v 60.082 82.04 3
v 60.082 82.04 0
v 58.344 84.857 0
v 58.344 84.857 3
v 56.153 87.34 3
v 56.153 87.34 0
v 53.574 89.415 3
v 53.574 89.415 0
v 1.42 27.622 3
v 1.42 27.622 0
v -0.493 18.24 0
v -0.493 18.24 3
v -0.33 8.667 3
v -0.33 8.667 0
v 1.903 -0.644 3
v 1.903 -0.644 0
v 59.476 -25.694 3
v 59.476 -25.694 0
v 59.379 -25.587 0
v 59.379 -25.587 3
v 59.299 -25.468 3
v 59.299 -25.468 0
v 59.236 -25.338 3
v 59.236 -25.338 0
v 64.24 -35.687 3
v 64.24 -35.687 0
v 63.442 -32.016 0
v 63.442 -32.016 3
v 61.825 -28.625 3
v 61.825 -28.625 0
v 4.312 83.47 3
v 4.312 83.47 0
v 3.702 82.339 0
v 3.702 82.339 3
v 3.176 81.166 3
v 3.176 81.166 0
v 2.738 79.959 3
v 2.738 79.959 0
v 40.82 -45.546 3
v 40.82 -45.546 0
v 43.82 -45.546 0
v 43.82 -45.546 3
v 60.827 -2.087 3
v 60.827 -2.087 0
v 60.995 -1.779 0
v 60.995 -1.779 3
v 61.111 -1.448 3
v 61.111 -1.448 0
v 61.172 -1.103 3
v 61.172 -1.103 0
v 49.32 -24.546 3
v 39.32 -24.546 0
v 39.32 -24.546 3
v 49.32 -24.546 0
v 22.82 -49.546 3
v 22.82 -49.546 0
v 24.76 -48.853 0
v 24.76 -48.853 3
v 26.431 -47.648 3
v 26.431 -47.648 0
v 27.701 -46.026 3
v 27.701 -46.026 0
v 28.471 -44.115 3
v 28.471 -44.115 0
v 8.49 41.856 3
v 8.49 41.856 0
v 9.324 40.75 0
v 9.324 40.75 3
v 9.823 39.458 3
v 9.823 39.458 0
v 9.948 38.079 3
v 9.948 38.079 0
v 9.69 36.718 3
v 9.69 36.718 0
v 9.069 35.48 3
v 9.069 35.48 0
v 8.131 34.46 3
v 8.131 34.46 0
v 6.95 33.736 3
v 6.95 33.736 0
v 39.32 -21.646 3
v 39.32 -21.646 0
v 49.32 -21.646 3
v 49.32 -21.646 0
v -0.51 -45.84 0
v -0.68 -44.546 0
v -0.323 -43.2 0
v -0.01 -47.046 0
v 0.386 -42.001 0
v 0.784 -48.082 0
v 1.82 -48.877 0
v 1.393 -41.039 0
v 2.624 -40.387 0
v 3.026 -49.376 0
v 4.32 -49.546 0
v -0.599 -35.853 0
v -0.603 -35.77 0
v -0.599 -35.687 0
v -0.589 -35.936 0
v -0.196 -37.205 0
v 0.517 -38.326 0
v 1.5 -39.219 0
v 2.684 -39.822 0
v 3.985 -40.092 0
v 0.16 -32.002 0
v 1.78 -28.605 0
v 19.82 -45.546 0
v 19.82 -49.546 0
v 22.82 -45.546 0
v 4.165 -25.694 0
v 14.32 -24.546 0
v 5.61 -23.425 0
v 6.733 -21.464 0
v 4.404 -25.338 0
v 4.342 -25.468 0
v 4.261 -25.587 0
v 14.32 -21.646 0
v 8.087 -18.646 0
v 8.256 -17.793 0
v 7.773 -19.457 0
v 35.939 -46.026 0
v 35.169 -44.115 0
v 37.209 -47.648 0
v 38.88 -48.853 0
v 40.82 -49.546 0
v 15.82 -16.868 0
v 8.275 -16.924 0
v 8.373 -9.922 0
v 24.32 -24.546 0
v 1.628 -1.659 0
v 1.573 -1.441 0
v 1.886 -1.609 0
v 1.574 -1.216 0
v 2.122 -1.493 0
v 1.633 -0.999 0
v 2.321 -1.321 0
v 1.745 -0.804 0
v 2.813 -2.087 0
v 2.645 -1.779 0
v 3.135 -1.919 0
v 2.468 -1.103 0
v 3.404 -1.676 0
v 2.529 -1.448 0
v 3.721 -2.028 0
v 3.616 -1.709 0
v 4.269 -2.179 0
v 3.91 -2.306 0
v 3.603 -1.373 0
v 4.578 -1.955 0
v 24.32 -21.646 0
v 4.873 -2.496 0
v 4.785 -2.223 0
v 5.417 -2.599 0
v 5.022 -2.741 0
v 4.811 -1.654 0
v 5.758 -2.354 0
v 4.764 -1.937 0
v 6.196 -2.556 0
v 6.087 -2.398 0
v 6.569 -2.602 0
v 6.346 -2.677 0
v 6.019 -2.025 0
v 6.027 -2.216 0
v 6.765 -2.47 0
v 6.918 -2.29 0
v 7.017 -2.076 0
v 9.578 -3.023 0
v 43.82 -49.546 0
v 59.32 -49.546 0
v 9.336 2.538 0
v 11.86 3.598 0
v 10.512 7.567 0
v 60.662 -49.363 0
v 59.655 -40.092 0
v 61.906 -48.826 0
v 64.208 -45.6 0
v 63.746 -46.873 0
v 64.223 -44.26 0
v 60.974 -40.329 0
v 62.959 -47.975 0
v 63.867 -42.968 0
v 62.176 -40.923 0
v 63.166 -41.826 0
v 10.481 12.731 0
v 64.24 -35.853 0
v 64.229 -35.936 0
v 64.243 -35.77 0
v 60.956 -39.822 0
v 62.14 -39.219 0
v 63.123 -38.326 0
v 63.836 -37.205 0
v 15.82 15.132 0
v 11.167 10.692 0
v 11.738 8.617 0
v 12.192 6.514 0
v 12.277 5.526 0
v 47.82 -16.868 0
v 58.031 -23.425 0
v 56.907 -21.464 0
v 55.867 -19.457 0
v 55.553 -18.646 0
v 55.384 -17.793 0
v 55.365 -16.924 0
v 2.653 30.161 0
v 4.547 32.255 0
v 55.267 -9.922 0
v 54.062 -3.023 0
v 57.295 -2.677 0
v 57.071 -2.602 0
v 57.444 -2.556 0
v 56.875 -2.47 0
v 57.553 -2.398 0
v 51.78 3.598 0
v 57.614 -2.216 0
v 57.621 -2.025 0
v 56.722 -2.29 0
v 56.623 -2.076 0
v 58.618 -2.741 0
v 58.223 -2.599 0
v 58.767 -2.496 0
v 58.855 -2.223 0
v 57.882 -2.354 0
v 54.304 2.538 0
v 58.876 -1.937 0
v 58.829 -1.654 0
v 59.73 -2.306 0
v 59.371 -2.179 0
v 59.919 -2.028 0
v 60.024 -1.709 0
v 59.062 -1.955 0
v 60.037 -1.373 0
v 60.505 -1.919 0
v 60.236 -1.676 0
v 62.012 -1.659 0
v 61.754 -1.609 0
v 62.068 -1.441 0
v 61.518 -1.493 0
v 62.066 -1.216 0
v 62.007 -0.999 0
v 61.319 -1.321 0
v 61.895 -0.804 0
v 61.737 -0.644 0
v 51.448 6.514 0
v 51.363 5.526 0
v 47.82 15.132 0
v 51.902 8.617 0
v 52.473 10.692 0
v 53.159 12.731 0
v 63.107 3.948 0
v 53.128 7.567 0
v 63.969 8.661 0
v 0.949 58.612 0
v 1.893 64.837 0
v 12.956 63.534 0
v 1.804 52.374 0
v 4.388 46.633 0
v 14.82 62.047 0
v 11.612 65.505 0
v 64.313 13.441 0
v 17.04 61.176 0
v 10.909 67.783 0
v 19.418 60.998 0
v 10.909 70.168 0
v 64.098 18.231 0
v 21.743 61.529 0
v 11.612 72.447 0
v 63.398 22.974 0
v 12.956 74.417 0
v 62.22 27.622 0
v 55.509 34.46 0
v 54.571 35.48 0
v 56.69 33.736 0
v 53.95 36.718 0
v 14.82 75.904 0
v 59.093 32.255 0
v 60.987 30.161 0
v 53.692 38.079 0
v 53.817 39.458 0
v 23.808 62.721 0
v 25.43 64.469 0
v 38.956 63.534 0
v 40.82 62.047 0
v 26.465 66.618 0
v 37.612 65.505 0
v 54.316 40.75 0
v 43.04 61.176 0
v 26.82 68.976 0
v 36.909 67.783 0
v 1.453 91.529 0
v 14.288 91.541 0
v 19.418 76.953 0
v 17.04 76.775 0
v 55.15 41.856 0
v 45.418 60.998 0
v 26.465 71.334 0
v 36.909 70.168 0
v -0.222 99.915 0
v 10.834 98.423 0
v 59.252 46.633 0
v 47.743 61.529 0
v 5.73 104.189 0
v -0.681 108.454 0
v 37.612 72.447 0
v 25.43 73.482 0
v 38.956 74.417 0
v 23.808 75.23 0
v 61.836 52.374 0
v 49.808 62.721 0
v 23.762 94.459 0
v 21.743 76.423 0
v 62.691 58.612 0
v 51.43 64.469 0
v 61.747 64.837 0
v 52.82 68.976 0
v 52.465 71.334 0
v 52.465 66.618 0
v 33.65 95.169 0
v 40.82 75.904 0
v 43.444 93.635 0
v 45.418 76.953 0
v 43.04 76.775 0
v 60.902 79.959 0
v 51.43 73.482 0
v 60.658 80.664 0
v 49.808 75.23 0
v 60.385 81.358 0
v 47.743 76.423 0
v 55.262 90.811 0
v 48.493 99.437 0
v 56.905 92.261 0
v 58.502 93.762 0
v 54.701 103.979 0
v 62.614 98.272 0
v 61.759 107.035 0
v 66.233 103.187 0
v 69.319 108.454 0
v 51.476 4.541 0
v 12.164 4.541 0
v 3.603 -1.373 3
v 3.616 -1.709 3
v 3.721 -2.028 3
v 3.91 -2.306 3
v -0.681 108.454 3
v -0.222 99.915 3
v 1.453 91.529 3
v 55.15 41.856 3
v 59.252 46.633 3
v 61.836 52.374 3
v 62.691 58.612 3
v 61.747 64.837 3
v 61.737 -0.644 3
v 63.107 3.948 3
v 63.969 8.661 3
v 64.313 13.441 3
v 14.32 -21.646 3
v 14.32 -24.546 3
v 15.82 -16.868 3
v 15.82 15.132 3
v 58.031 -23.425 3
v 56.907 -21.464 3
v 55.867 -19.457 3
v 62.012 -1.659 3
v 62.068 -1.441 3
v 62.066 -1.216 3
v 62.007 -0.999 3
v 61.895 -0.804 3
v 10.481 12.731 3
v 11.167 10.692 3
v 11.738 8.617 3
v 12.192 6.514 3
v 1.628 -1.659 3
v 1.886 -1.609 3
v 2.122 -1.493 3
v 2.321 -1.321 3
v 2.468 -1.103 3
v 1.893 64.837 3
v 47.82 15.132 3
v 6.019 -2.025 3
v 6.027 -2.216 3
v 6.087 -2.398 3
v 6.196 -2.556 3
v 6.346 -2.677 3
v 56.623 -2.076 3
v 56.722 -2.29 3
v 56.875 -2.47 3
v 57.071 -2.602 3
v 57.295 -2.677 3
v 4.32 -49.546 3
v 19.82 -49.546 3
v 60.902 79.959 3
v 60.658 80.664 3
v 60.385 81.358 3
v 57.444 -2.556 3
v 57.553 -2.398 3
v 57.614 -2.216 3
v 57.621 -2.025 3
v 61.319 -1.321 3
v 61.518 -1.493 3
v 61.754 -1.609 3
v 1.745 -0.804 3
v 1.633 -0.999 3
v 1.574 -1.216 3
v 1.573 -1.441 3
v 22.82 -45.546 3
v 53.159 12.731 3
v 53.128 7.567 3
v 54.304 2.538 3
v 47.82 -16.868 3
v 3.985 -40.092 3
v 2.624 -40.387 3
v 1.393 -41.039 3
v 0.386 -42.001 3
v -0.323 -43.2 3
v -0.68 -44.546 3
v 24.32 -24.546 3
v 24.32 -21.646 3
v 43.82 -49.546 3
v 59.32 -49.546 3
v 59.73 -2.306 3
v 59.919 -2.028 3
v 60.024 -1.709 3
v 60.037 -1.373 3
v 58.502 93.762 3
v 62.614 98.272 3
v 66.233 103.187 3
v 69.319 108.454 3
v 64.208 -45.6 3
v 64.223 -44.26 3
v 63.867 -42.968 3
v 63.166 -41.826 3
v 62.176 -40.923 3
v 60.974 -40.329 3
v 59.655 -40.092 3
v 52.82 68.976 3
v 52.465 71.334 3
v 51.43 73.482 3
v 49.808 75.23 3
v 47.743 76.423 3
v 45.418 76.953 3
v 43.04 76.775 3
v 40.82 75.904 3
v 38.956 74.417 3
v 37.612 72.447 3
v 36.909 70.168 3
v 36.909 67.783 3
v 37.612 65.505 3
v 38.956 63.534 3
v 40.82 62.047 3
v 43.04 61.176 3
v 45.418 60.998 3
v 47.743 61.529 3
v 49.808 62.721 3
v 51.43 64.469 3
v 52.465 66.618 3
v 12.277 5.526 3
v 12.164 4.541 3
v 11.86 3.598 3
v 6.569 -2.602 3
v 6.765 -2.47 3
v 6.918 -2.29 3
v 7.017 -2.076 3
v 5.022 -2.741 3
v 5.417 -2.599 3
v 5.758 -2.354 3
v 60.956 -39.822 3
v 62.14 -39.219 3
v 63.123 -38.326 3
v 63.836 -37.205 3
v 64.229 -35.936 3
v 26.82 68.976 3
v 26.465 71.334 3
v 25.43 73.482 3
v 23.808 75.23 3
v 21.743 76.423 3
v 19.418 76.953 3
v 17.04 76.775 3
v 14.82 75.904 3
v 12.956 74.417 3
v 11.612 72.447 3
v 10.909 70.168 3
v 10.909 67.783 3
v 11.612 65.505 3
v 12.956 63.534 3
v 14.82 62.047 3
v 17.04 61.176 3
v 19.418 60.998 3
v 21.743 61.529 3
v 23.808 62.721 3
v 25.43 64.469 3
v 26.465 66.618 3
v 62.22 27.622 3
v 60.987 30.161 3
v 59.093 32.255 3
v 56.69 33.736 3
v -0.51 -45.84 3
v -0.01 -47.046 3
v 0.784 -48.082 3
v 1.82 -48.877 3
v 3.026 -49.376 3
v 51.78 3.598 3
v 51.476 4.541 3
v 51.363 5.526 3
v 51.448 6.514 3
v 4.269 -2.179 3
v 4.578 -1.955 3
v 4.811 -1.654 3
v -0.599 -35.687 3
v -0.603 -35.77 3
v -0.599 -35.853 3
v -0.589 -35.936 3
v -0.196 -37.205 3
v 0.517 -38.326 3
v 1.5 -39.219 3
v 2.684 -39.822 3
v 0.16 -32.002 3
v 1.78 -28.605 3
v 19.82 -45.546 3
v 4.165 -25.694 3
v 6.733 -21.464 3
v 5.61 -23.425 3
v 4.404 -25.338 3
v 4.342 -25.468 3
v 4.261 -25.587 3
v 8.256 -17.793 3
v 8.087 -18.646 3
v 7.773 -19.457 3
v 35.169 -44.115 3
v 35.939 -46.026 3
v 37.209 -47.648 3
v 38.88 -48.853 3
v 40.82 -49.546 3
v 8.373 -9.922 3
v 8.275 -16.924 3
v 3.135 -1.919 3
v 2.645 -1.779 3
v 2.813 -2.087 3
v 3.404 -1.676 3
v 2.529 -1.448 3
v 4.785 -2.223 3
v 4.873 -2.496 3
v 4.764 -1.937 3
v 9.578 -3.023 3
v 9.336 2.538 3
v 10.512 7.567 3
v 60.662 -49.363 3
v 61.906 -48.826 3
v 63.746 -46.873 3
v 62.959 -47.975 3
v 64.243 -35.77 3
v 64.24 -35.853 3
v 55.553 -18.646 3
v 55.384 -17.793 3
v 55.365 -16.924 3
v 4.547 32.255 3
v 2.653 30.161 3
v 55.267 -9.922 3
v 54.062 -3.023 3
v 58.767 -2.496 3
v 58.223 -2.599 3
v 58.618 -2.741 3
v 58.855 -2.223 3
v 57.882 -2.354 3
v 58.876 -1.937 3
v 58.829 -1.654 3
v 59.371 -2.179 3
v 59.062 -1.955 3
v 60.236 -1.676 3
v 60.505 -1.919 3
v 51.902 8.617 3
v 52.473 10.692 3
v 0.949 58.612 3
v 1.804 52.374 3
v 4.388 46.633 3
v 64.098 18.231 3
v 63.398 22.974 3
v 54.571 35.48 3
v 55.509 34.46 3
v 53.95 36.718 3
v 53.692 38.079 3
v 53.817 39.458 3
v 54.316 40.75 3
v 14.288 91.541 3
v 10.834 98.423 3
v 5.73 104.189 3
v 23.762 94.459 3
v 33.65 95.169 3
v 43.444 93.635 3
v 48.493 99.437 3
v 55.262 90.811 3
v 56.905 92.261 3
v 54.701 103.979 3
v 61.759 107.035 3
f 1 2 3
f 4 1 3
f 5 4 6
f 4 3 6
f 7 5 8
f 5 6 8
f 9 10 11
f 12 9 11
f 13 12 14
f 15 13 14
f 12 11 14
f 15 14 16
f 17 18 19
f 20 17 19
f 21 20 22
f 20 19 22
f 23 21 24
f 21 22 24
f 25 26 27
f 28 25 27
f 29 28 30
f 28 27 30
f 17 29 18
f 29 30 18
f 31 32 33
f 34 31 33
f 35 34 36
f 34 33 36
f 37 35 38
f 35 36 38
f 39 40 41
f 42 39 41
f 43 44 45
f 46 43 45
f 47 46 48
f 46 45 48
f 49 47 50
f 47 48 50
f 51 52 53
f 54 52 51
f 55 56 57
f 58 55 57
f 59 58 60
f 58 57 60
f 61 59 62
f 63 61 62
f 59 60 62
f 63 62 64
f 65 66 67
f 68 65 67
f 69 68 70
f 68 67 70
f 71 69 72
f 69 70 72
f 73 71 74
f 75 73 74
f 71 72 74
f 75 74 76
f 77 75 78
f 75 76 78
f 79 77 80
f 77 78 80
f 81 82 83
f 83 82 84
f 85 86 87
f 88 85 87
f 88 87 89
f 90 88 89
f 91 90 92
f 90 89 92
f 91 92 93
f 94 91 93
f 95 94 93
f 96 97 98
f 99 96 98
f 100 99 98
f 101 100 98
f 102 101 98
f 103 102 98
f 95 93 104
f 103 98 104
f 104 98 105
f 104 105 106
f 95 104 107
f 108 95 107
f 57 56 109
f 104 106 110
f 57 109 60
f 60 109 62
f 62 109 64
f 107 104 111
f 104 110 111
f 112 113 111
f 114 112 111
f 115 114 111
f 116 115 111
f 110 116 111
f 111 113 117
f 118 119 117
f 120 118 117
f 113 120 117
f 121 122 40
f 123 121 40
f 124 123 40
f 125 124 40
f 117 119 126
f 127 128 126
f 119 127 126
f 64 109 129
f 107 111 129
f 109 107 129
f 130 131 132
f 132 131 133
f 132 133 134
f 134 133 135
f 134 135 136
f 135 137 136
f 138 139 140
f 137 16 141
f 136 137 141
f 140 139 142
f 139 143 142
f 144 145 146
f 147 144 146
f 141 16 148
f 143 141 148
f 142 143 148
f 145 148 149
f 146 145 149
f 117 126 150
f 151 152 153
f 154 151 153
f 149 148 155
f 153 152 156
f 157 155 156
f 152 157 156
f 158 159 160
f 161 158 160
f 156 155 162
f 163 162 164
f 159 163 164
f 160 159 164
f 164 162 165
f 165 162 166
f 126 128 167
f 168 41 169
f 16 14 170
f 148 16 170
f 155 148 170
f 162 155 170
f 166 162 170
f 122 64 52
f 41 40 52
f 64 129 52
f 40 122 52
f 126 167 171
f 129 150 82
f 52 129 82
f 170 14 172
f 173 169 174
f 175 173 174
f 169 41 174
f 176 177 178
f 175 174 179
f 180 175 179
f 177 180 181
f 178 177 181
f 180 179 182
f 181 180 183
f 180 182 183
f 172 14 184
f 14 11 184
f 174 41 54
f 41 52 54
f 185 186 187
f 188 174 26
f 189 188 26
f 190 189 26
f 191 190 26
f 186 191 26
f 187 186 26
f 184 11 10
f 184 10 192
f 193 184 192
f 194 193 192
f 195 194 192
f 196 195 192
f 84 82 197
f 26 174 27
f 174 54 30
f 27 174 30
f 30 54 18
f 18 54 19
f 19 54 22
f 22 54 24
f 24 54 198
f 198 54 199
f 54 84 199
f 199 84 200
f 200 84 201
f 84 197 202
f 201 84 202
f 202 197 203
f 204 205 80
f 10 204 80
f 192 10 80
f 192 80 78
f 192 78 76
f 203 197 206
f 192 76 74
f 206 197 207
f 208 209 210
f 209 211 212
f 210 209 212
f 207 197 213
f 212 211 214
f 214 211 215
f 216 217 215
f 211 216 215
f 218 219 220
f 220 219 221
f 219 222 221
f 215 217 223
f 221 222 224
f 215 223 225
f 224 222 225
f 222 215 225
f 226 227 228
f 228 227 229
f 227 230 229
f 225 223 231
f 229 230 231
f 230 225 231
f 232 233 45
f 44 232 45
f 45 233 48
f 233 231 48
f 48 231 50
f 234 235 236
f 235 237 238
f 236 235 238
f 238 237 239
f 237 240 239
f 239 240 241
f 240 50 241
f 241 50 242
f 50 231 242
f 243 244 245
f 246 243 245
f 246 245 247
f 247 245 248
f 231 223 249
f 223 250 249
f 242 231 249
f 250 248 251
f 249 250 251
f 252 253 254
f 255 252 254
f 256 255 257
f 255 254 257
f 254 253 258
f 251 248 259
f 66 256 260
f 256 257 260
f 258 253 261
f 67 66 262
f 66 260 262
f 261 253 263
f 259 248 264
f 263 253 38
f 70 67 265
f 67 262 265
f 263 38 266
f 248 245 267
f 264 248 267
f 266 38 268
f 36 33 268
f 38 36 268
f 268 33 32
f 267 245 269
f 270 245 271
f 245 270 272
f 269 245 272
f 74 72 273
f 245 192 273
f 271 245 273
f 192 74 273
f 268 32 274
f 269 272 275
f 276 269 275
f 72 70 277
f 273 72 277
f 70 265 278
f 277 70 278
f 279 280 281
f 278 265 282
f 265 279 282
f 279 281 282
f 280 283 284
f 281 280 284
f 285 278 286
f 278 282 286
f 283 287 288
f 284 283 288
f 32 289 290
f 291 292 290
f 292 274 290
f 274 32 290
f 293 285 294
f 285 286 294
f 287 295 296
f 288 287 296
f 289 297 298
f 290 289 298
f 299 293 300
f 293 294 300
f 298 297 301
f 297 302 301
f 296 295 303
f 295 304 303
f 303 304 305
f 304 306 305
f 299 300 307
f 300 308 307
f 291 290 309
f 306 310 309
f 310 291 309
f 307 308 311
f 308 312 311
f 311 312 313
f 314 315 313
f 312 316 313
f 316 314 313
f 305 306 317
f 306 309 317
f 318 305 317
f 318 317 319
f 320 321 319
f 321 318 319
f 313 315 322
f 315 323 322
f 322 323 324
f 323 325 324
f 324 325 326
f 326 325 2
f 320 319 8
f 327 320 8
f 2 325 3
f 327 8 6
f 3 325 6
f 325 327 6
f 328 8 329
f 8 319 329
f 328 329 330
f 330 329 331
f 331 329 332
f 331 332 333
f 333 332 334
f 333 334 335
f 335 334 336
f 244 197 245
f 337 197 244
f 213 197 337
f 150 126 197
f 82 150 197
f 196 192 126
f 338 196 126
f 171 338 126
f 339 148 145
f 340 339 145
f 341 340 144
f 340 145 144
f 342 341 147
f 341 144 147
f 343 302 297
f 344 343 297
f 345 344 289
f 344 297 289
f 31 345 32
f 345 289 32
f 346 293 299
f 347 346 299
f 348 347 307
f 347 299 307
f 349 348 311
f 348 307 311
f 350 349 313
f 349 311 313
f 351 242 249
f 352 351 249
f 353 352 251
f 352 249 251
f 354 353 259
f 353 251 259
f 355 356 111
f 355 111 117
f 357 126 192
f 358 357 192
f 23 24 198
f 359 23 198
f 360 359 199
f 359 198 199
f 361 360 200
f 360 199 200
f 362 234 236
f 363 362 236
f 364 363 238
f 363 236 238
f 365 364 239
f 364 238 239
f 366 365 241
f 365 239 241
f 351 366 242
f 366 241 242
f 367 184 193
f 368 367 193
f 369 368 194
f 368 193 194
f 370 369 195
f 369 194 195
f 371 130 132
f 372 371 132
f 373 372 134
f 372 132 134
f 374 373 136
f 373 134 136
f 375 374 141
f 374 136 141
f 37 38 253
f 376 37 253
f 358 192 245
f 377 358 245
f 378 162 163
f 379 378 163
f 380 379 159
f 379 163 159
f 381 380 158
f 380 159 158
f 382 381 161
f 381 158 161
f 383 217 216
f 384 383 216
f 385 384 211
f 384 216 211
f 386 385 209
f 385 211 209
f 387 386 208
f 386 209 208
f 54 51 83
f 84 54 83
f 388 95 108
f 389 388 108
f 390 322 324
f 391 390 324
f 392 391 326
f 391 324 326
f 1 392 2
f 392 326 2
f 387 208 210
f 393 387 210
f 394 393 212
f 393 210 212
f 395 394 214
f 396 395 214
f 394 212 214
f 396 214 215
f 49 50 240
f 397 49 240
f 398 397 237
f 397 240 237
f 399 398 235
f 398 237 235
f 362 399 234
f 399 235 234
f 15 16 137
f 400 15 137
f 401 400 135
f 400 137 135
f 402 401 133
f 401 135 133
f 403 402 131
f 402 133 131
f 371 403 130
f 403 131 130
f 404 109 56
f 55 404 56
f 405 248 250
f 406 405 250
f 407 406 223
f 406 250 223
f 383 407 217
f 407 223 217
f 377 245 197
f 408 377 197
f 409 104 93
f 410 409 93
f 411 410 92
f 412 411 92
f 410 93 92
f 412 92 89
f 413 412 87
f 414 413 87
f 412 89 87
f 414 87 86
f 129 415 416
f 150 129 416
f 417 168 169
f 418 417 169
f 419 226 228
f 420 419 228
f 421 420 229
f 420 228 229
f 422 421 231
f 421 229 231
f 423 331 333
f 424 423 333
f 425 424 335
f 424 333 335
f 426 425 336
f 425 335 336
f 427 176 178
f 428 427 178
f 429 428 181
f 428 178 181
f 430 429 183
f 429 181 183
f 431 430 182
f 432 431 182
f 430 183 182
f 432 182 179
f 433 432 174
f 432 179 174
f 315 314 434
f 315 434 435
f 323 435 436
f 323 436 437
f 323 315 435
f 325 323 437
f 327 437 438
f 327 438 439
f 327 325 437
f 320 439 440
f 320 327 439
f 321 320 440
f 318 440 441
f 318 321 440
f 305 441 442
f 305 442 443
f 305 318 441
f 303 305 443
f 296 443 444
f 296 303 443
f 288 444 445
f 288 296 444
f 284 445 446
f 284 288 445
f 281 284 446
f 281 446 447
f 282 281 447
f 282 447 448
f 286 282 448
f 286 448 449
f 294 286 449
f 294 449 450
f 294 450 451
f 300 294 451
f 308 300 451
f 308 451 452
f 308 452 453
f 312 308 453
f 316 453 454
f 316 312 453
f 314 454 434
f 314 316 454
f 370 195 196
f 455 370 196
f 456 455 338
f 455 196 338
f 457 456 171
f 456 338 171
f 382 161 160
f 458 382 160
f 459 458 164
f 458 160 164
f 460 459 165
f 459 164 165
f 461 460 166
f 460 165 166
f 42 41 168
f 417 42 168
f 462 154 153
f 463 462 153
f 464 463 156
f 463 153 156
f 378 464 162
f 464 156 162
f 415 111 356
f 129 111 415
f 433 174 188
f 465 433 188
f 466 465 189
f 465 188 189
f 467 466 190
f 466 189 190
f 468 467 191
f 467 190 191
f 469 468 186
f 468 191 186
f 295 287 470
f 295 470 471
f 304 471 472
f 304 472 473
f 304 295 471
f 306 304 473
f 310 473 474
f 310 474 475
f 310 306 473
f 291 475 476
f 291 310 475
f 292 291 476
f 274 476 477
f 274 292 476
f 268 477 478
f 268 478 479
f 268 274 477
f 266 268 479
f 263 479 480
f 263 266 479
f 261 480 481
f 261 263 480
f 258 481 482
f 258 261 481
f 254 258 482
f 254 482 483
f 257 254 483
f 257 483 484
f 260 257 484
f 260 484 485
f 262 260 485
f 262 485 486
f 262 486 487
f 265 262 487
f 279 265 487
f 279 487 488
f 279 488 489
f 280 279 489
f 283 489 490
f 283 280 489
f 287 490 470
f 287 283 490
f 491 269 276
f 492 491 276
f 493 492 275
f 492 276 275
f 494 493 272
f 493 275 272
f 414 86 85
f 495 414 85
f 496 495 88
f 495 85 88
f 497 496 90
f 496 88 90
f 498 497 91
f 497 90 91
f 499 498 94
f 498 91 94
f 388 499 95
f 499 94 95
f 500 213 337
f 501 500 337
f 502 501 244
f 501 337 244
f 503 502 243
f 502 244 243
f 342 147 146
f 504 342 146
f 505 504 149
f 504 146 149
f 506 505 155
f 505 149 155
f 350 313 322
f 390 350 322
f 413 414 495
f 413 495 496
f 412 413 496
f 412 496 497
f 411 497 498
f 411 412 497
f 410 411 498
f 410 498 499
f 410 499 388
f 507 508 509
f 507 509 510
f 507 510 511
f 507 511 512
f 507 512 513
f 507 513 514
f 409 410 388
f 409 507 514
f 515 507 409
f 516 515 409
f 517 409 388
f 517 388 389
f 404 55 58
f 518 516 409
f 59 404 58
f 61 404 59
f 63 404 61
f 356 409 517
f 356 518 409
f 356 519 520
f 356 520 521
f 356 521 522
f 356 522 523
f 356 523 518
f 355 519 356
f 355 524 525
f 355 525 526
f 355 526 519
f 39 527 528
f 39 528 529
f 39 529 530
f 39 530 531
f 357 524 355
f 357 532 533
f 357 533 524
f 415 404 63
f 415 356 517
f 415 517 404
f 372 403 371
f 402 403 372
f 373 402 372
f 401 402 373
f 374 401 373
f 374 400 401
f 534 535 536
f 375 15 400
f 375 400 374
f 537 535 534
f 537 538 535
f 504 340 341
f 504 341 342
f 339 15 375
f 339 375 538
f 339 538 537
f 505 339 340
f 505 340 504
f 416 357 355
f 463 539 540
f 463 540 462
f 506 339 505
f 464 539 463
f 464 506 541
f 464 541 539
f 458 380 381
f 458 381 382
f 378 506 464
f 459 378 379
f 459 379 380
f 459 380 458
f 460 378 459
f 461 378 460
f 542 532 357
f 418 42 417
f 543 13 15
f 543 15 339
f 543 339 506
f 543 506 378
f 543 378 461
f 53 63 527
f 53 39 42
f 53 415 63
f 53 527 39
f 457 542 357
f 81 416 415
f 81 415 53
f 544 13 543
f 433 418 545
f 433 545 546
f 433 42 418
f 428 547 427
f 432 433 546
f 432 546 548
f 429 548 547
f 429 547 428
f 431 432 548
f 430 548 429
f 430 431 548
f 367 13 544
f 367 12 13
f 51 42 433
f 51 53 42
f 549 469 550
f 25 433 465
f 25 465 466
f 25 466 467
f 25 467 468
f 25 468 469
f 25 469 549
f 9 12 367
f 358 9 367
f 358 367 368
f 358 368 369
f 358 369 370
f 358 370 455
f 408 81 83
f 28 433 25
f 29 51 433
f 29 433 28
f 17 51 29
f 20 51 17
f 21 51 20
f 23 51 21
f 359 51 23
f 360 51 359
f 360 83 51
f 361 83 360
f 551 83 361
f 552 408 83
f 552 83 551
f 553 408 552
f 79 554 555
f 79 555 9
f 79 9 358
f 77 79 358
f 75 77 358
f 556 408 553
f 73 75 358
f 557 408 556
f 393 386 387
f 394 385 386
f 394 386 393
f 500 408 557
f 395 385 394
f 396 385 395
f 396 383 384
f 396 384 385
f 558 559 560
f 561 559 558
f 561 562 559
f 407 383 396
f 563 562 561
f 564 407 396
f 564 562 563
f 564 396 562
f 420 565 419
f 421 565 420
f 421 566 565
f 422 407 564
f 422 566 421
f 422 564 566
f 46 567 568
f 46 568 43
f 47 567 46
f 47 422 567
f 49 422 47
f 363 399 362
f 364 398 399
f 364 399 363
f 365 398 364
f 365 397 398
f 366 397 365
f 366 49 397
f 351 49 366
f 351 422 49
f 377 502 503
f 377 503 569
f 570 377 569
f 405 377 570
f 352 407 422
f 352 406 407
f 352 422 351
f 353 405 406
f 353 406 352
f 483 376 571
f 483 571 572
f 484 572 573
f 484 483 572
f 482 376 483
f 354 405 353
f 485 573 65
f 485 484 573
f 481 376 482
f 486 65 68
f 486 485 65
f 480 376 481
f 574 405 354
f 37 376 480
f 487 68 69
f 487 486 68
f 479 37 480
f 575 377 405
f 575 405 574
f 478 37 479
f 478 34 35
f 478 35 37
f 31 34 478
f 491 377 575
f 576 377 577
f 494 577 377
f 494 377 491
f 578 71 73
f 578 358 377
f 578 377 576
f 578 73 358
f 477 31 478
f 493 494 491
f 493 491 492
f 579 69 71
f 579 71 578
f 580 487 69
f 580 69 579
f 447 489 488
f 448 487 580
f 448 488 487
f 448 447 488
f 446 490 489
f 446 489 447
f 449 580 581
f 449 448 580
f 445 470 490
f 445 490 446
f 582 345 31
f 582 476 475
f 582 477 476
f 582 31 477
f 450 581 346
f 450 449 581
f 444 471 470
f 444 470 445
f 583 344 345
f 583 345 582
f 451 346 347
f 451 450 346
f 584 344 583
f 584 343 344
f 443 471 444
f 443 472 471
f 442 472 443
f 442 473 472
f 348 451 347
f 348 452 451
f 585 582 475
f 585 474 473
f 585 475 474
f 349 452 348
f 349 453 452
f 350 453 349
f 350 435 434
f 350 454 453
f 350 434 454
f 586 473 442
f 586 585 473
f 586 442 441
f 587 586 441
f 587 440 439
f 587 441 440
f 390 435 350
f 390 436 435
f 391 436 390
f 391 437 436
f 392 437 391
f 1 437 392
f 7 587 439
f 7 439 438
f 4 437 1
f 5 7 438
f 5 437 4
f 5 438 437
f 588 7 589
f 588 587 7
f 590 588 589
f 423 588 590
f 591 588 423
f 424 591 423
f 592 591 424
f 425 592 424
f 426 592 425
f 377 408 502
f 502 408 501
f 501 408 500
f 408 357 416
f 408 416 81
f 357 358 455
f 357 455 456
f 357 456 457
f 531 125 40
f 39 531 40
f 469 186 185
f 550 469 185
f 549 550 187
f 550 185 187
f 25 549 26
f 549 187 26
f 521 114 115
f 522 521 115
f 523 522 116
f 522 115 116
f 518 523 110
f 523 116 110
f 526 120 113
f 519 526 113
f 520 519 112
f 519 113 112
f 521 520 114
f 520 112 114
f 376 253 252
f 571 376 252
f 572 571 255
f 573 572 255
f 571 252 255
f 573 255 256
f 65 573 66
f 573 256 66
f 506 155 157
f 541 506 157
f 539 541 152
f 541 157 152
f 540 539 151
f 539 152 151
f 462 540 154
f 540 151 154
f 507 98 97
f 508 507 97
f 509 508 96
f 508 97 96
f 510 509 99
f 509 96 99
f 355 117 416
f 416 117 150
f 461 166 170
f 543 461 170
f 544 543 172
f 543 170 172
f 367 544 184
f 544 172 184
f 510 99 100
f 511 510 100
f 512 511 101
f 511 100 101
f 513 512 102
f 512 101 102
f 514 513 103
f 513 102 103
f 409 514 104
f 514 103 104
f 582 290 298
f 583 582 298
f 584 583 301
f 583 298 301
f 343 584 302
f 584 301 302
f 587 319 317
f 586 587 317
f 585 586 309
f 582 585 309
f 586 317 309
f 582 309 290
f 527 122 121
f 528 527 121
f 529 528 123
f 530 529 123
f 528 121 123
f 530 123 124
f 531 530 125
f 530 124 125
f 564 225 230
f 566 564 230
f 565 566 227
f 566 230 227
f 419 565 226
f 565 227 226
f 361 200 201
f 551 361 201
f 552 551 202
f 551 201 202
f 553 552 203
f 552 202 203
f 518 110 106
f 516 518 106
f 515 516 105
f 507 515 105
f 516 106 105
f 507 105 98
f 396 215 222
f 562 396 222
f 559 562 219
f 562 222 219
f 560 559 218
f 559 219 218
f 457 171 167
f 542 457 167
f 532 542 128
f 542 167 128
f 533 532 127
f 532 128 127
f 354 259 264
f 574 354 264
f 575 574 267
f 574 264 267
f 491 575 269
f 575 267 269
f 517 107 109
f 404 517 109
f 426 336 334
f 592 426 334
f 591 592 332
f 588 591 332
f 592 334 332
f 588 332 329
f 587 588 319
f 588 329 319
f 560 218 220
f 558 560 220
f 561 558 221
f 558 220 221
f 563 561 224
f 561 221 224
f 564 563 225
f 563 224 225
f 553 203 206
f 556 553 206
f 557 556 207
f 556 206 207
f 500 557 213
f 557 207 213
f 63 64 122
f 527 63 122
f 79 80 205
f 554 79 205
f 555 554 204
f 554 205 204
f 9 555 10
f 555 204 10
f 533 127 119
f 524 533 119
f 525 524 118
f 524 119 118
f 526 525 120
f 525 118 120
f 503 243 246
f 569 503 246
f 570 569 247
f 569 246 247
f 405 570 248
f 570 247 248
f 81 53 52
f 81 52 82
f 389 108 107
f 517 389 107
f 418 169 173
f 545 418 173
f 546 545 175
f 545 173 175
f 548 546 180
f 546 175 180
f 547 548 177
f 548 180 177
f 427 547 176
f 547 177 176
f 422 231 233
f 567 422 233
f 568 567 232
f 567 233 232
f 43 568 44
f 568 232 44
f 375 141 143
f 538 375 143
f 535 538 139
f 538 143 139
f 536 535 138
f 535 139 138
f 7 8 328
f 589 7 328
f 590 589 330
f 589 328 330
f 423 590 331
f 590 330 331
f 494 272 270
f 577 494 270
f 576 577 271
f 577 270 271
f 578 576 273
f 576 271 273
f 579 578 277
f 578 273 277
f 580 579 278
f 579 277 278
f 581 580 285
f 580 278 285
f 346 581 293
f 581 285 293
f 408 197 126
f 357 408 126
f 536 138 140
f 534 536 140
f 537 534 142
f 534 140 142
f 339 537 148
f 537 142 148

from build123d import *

# Parameters (mm, degrees)
MODEL_R                 = 8
MODEL_W                 = 10
MODEL_H                 = 2.9
SALIENTE_EXTRUIR1_DEPTH = 3


with BuildPart() as part:
    # Model → Saliente-Extruir1 (new body)
    with BuildSketch(Plane.XY):
        with BuildLine():
            Line((2.738139573, 79.958721833), (1.893307256, 64.837008948))
            ThreePointArc((1.893307256, 64.837008948), (1.804094173, 52.374094451), (8.490003457, 41.855976094))
            ThreePointArc((8.490003457, 41.855976094), (9.866643854, 37.389168926), (6.950289352, 33.736446451))
            ThreePointArc((6.950289352, 33.736446451), (3.525794094, 31.275549631), (1.420223138, 27.621818403))
            ThreePointArc((1.420223138, 27.621818403), (-0.672991735, 13.448943974), (1.903257207, -0.64413445))
            ThreePointArc((1.903257207, -0.64413445), (1.596863178, -1.105922047), (1.627780863, -1.659247614))
            ThreePointArc((1.627780863, -1.659247614), (2.122286511, -1.493378675), (2.468024937, -1.102849184))
            ThreePointArc((2.468024937, -1.102849184), (2.58077221, -1.616114359), (2.813255055, -2.087394334))
            ThreePointArc((2.813255055, -2.087394334), (3.27699089, -1.806143429), (3.602865379, -1.372601258))
            ThreePointArc((3.602865379, -1.372601258), (3.657014656, -1.871943312), (3.909736594, -2.306001204))
            ThreePointArc((3.909736594, -2.306001204), (4.43140284, -2.078027301), (4.811170789, -1.653899872))
            ThreePointArc((4.811170789, -1.653899872), (4.785196909, -2.222836522), (5.02214475, -2.740735426))
            ThreePointArc((5.02214475, -2.740735426), (5.596433055, -2.488050459), (6.0194762, -2.02470259))
            ThreePointArc((6.0194762, -2.02470259), (6.087237768, -2.398385139), (6.345526866, -2.676803923))
            ThreePointArc((6.345526866, -2.676803923), (6.76512344, -2.4701067), (7.016807649, -2.075847793))
            ThreePointArc((7.016807649, -2.075847793), (10.072385436, 5.017714023), (10.480834721, 12.730582753))
            ThreePointArc((10.480834721, 12.730582753), (11.467458305, 9.658521652), (12.192311398, 6.514388466))
            ThreePointArc((12.192311398, 6.514388466), (12.245025503, 5.0311028), (11.859988831, 3.59769361))
            ThreePointArc((11.859988831, 3.59769361), (8.838306655, -6.448503975), (8.27496016, -16.924156212))
            ThreePointArc((8.27496016, -16.924156212), (8.190311904, -18.223316893), (7.773132872, -19.456583068))
            ThreePointArc((7.773132872, -19.456583068), (6.18189197, -22.450615029), (4.403832579, -25.337616899))
            ThreePointArc((4.403832579, -25.337616899), (4.303591918, -25.529024451), (4.164576282, -25.69443211))
            ThreePointArc((4.164576282, -25.69443211), (0.867440919, -30.254572833), (-0.599469924, -35.687266233))
            ThreePointArc((-0.599469924, -35.687266233), (-0.601989014, -35.811902896), (-0.588981272, -35.935884517))
            ThreePointArc((-0.588981272, -35.935884517), (0.978789677, -38.80548638), (3.98481018, -40.092483401))
            ThreePointArc((3.98481018, -40.092483401), (0.856364533, -41.485661692), (-0.680047474, -44.546308039))
            ThreePointArc((-0.680047474, -44.546308039), (0.784377961, -48.081916287), (4.319952525, -49.54642304))
            Line((4.319952525, -49.54642304), (19.820067057, -49.54642304))
            Line((19.820067057, -49.54642304), (19.820067057, -45.54642304))
            Line((19.820067057, -45.54642304), (22.820067057, -45.54642304))
            Line((22.820067057, -45.54642304), (22.820067057, -49.54642304))
            ThreePointArc((22.820067057, -49.54642304), (26.431019228, -47.64752109), (28.47138138, -44.114572394))
            Line((28.47138138, -44.114572394), (35.168752734, -44.114572394))
            ThreePointArc((35.168752734, -44.114572394), (37.209114886, -47.64752109), (40.820067057, -49.54642304))
            Line((40.820067057, -49.54642304), (40.820067057, -45.54642304))
            Line((40.820067057, -45.54642304), (43.820067057, -45.54642304))
            Line((43.820067057, -45.54642304), (43.820067057, -49.54642304))
            Line((43.820067057, -49.54642304), (59.320181589, -49.54642304))
            ThreePointArc((59.320181589, -49.54642304), (62.461382403, -48.436520397), (64.208012382, -45.599566018))
            ThreePointArc((64.208012382, -45.599566018), (63.165796759, -41.825774349), (59.655323933, -40.092483401))
            ThreePointArc((59.655323933, -40.092483401), (62.661344437, -38.80548638), (64.229115385, -35.935884517))
            ThreePointArc((64.229115385, -35.935884517), (64.242123128, -35.811902896), (64.239604038, -35.687266233))
            ThreePointArc((64.239604038, -35.687266233), (62.731421175, -30.274249113), (59.475557832, -25.69443211))
            ThreePointArc((59.475557832, -25.69443211), (59.336542196, -25.529024451), (59.236301535, -25.337616899))
            ThreePointArc((59.236301535, -25.337616899), (57.458242143, -22.450615029), (55.867001242, -19.456583068))
            ThreePointArc((55.867001242, -19.456583068), (55.449822209, -18.223316893), (55.365173954, -16.924156212))
            ThreePointArc((55.365173954, -16.924156212), (54.801827459, -6.448503975), (51.780145282, 3.59769361))
            ThreePointArc((51.780145282, 3.59769361), (51.395108611, 5.0311028), (51.447822716, 6.514388466))
            ThreePointArc((51.447822716, 6.514388466), (52.172675809, 9.658521652), (53.159299392, 12.730582753))
            ThreePointArc((53.159299392, 12.730582753), (53.567748677, 5.017714023), (56.623326464, -2.075847793))
            ThreePointArc((56.623326464, -2.075847793), (56.875010673, -2.4701067), (57.294607248, -2.676803923))
            ThreePointArc((57.294607248, -2.676803923), (57.552896345, -2.398385139), (57.620657914, -2.02470259))
            ThreePointArc((57.620657914, -2.02470259), (58.043701059, -2.488050459), (58.617989364, -2.740735426))
            ThreePointArc((58.617989364, -2.740735426), (58.854937205, -2.222836522), (58.828963324, -1.653899872))
            ThreePointArc((58.828963324, -1.653899872), (59.208731274, -2.078027301), (59.73039752, -2.306001204))
            ThreePointArc((59.73039752, -2.306001204), (59.983119457, -1.871943312), (60.037268735, -1.372601258))
            ThreePointArc((60.037268735, -1.372601258), (60.363143224, -1.806143429), (60.826879059, -2.087394334))
            ThreePointArc((60.826879059, -2.087394334), (61.059361903, -1.616114359), (61.172109176, -1.102849184))
            ThreePointArc((61.172109176, -1.102849184), (61.517847602, -1.493378675), (62.012353251, -1.659247614))
            ThreePointArc((62.012353251, -1.659247614), (62.043270935, -1.105922047), (61.736876906, -0.64413445))
            ThreePointArc((61.736876906, -0.64413445), (63.602383612, 6.292702198), (64.312985392, 13.440769284))
            ThreePointArc((64.312985392, 13.440769284), (63.807919995, 20.611213234), (62.219910975, 27.621818403))
            ThreePointArc((62.219910975, 27.621818403), (60.11434002, 31.275549631), (56.689844761, 33.736446451))
            ThreePointArc((56.689844761, 33.736446451), (53.773490259, 37.389168926), (55.150130657, 41.855976094))
            ThreePointArc((55.150130657, 41.855976094), (61.836039941, 52.374094451), (61.746826857, 64.837008948))
            Line((61.746826857, 64.837008948), (60.901994541, 79.958721833))
            ThreePointArc((60.901994541, 79.958721833), (60.52523779, 81.01221194), (60.082132629, 82.039560406))
            ThreePointArc((60.082132629, 82.039560406), (57.301545651, 86.145115147), (53.573638816, 89.414664704))
            ThreePointArc((53.573638816, 89.414664704), (56.089558762, 91.529262633), (58.501636282, 93.761584207))
            ThreePointArc((58.501636282, 93.761584207), (64.487990723, 100.682191439), (69.3188096, 108.45357696))
            ThreePointArc((69.3188096, 108.45357696), (54.700807458, 103.978782371), (43.444082198, 93.634899654))
            ThreePointArc((43.444082198, 93.634899654), (28.686150355, 95.095319384), (14.288476391, 91.540553218))
            ThreePointArc((14.288476391, 91.540553218), (8.469304852, 101.471337422), (-0.6811904, 108.45357696))
            ThreePointArc((-0.6811904, 108.45357696), (0.464967816, 95.691689927), (4.311825224, 83.469532696))
            ThreePointArc((4.311825224, 83.469532696), (3.428504493, 81.757372515), (2.738139573, 79.958721833))
        make_face()
        with Locations((18.820067057, 68.975620222)):
            Circle(MODEL_R, mode=Mode.SUBTRACT)
        with Locations((44.820067057, 68.975620222)):
            Circle(MODEL_R, mode=Mode.SUBTRACT)
        with Locations((44.320067057, -23.09642304)):
            Rectangle(MODEL_W, MODEL_H, mode=Mode.SUBTRACT)
        with Locations((19.320067057, -23.09642304)):
            Rectangle(MODEL_W, MODEL_H, mode=Mode.SUBTRACT)
        Polygon((32.320067057, 15.131610977), (47.820067057, 15.131610977), (47.820067057, -16.868389023), (15.820067057, -16.868389023), (15.820067057, 15.131610977), align=None, mode=Mode.SUBTRACT)
    extrude(amount=SALIENTE_EXTRUIR1_DEPTH)


solid = part.part
